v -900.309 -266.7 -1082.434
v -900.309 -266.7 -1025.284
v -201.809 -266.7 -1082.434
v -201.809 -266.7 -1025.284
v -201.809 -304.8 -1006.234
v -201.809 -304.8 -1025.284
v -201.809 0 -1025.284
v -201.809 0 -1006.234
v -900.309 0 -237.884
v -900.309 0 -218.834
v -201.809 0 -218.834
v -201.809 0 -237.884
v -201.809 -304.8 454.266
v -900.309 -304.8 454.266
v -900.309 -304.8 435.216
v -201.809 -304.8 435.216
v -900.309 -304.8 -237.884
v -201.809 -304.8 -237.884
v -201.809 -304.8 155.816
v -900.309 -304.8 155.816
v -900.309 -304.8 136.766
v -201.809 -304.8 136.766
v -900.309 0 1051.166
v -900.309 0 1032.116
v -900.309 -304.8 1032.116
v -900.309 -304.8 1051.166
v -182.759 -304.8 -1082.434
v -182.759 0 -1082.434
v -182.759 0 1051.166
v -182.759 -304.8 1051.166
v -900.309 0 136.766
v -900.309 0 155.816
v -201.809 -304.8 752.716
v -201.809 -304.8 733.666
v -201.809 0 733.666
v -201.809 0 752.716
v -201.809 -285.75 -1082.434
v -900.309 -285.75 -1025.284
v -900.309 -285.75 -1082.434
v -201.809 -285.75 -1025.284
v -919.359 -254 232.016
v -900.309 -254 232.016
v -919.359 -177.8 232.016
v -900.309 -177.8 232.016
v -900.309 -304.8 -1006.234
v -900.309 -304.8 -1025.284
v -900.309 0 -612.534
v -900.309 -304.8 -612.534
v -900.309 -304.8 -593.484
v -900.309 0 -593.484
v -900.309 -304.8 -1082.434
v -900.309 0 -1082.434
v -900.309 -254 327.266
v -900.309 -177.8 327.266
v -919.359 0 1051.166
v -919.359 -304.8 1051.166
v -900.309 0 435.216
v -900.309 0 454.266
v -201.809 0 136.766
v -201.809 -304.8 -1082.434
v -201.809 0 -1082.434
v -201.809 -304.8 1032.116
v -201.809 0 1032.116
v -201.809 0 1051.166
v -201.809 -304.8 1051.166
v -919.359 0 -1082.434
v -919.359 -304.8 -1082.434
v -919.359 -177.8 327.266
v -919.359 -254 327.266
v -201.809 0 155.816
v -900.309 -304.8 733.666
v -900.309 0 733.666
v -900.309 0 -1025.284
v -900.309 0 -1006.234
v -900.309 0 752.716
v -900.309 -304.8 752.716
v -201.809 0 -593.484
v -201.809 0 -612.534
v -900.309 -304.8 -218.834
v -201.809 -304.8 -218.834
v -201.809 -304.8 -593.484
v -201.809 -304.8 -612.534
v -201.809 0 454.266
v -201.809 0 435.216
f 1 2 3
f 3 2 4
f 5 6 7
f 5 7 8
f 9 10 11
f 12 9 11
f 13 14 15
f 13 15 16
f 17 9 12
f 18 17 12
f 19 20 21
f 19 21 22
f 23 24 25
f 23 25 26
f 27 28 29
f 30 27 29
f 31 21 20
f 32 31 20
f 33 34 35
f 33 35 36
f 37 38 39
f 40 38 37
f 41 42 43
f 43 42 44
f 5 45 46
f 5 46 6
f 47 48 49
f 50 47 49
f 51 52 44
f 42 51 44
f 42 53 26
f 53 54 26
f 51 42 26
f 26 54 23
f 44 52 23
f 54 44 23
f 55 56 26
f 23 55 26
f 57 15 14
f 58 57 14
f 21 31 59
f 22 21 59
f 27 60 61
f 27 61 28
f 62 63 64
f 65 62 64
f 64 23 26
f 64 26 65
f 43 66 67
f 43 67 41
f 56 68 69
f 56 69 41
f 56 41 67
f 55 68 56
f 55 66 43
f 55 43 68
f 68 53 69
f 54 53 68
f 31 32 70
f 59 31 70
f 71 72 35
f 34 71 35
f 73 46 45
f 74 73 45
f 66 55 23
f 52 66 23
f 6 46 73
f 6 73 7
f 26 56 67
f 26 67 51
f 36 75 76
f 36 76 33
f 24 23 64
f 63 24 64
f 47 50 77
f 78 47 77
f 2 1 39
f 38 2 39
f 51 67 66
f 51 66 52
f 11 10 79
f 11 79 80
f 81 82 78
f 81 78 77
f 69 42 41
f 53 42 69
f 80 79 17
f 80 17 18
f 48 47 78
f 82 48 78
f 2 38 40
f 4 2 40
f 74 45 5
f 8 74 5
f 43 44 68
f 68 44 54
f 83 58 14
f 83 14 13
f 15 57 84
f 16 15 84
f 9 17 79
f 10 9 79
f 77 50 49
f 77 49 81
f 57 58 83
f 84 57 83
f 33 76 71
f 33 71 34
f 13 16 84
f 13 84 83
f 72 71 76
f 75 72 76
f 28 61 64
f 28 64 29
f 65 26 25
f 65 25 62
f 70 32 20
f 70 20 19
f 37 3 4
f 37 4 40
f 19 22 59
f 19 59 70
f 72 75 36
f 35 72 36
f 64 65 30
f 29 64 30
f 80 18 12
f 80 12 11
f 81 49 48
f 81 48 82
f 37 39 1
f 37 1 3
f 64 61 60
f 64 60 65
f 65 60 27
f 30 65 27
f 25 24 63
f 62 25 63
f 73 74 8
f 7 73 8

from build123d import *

# Parameters (mm, degrees)
F0_W     = 19.05
F0_H     = 2133.6
F1_DEPTH = 304.8
F2_W     = 698.5
F2_H     = 19.05
F3_DEPTH = 304.8
F4_W     = 698.5
F4_H     = 19.05
F5_DEPTH = 304.8
F6_W     = 698.5
F6_H     = 19.05
F7_DEPTH = 57.15
F8_W     = 76.2
F8_H     = 95.25
F9_DEPTH = 25.4


with BuildPart() as f1:
    # F0 (on Front) → F1 (new body)
    with BuildSketch(Plane.XZ):
        with Locations((-909.834336, -15.634368)):
            Rectangle(F0_W, F0_H)
        with Locations((-192.284336, -15.634368)):
            Rectangle(F0_W, F0_H)
    extrude(amount=F1_DEPTH)

    # F8 (on face) → F9 (cut)
    with BuildSketch(Plane.YZ.offset(-900.309336)):
        with Locations((-215.9, 279.640632)):
            Rectangle(F8_W, F8_H)
    extrude(amount=-F9_DEPTH, mode=Mode.SUBTRACT)


with BuildPart() as f3:
    # F2 (on Front) → F3 (new body)
    with BuildSketch(Plane.XZ):
        with Locations((-551.059336, -603.009368)):
            Rectangle(F2_W, F2_H)
        with Locations((-551.059336, -228.359368)):
            Rectangle(F2_W, F2_H)
        with Locations((-551.059336, 146.290632)):
            Rectangle(F2_W, F2_H)
        with Locations((-551.059336, 444.740632)):
            Rectangle(F2_W, F2_H)
        with Locations((-551.059336, 743.190632)):
            Rectangle(F2_W, F2_H)
        with Locations((-551.059336, 1041.640632)):
            Rectangle(F2_W, F2_H)
    extrude(amount=F3_DEPTH)


with BuildPart() as f5:
    # F4 (on face) → F5 (new body)
    with BuildSketch(Plane.XZ.offset(304.8)):
        with Locations((-551.059336, -1015.759368)):
            Rectangle(F4_W, F4_H)
    extrude(amount=-F5_DEPTH)


with BuildPart() as f7:
    # F6 (on face) → F7 (new body, through all)
    with BuildSketch(Plane(origin=(0, 0, -1025.284368), x_dir=(1, 0, 0), z_dir=(0, 0, -1))):
        with Locations((-551.059336, 276.225)):
            Rectangle(F6_W, F6_H)
    extrude(amount=F7_DEPTH)


solid = Compound([f1.part, f3.part, f5.part, f7.part])
